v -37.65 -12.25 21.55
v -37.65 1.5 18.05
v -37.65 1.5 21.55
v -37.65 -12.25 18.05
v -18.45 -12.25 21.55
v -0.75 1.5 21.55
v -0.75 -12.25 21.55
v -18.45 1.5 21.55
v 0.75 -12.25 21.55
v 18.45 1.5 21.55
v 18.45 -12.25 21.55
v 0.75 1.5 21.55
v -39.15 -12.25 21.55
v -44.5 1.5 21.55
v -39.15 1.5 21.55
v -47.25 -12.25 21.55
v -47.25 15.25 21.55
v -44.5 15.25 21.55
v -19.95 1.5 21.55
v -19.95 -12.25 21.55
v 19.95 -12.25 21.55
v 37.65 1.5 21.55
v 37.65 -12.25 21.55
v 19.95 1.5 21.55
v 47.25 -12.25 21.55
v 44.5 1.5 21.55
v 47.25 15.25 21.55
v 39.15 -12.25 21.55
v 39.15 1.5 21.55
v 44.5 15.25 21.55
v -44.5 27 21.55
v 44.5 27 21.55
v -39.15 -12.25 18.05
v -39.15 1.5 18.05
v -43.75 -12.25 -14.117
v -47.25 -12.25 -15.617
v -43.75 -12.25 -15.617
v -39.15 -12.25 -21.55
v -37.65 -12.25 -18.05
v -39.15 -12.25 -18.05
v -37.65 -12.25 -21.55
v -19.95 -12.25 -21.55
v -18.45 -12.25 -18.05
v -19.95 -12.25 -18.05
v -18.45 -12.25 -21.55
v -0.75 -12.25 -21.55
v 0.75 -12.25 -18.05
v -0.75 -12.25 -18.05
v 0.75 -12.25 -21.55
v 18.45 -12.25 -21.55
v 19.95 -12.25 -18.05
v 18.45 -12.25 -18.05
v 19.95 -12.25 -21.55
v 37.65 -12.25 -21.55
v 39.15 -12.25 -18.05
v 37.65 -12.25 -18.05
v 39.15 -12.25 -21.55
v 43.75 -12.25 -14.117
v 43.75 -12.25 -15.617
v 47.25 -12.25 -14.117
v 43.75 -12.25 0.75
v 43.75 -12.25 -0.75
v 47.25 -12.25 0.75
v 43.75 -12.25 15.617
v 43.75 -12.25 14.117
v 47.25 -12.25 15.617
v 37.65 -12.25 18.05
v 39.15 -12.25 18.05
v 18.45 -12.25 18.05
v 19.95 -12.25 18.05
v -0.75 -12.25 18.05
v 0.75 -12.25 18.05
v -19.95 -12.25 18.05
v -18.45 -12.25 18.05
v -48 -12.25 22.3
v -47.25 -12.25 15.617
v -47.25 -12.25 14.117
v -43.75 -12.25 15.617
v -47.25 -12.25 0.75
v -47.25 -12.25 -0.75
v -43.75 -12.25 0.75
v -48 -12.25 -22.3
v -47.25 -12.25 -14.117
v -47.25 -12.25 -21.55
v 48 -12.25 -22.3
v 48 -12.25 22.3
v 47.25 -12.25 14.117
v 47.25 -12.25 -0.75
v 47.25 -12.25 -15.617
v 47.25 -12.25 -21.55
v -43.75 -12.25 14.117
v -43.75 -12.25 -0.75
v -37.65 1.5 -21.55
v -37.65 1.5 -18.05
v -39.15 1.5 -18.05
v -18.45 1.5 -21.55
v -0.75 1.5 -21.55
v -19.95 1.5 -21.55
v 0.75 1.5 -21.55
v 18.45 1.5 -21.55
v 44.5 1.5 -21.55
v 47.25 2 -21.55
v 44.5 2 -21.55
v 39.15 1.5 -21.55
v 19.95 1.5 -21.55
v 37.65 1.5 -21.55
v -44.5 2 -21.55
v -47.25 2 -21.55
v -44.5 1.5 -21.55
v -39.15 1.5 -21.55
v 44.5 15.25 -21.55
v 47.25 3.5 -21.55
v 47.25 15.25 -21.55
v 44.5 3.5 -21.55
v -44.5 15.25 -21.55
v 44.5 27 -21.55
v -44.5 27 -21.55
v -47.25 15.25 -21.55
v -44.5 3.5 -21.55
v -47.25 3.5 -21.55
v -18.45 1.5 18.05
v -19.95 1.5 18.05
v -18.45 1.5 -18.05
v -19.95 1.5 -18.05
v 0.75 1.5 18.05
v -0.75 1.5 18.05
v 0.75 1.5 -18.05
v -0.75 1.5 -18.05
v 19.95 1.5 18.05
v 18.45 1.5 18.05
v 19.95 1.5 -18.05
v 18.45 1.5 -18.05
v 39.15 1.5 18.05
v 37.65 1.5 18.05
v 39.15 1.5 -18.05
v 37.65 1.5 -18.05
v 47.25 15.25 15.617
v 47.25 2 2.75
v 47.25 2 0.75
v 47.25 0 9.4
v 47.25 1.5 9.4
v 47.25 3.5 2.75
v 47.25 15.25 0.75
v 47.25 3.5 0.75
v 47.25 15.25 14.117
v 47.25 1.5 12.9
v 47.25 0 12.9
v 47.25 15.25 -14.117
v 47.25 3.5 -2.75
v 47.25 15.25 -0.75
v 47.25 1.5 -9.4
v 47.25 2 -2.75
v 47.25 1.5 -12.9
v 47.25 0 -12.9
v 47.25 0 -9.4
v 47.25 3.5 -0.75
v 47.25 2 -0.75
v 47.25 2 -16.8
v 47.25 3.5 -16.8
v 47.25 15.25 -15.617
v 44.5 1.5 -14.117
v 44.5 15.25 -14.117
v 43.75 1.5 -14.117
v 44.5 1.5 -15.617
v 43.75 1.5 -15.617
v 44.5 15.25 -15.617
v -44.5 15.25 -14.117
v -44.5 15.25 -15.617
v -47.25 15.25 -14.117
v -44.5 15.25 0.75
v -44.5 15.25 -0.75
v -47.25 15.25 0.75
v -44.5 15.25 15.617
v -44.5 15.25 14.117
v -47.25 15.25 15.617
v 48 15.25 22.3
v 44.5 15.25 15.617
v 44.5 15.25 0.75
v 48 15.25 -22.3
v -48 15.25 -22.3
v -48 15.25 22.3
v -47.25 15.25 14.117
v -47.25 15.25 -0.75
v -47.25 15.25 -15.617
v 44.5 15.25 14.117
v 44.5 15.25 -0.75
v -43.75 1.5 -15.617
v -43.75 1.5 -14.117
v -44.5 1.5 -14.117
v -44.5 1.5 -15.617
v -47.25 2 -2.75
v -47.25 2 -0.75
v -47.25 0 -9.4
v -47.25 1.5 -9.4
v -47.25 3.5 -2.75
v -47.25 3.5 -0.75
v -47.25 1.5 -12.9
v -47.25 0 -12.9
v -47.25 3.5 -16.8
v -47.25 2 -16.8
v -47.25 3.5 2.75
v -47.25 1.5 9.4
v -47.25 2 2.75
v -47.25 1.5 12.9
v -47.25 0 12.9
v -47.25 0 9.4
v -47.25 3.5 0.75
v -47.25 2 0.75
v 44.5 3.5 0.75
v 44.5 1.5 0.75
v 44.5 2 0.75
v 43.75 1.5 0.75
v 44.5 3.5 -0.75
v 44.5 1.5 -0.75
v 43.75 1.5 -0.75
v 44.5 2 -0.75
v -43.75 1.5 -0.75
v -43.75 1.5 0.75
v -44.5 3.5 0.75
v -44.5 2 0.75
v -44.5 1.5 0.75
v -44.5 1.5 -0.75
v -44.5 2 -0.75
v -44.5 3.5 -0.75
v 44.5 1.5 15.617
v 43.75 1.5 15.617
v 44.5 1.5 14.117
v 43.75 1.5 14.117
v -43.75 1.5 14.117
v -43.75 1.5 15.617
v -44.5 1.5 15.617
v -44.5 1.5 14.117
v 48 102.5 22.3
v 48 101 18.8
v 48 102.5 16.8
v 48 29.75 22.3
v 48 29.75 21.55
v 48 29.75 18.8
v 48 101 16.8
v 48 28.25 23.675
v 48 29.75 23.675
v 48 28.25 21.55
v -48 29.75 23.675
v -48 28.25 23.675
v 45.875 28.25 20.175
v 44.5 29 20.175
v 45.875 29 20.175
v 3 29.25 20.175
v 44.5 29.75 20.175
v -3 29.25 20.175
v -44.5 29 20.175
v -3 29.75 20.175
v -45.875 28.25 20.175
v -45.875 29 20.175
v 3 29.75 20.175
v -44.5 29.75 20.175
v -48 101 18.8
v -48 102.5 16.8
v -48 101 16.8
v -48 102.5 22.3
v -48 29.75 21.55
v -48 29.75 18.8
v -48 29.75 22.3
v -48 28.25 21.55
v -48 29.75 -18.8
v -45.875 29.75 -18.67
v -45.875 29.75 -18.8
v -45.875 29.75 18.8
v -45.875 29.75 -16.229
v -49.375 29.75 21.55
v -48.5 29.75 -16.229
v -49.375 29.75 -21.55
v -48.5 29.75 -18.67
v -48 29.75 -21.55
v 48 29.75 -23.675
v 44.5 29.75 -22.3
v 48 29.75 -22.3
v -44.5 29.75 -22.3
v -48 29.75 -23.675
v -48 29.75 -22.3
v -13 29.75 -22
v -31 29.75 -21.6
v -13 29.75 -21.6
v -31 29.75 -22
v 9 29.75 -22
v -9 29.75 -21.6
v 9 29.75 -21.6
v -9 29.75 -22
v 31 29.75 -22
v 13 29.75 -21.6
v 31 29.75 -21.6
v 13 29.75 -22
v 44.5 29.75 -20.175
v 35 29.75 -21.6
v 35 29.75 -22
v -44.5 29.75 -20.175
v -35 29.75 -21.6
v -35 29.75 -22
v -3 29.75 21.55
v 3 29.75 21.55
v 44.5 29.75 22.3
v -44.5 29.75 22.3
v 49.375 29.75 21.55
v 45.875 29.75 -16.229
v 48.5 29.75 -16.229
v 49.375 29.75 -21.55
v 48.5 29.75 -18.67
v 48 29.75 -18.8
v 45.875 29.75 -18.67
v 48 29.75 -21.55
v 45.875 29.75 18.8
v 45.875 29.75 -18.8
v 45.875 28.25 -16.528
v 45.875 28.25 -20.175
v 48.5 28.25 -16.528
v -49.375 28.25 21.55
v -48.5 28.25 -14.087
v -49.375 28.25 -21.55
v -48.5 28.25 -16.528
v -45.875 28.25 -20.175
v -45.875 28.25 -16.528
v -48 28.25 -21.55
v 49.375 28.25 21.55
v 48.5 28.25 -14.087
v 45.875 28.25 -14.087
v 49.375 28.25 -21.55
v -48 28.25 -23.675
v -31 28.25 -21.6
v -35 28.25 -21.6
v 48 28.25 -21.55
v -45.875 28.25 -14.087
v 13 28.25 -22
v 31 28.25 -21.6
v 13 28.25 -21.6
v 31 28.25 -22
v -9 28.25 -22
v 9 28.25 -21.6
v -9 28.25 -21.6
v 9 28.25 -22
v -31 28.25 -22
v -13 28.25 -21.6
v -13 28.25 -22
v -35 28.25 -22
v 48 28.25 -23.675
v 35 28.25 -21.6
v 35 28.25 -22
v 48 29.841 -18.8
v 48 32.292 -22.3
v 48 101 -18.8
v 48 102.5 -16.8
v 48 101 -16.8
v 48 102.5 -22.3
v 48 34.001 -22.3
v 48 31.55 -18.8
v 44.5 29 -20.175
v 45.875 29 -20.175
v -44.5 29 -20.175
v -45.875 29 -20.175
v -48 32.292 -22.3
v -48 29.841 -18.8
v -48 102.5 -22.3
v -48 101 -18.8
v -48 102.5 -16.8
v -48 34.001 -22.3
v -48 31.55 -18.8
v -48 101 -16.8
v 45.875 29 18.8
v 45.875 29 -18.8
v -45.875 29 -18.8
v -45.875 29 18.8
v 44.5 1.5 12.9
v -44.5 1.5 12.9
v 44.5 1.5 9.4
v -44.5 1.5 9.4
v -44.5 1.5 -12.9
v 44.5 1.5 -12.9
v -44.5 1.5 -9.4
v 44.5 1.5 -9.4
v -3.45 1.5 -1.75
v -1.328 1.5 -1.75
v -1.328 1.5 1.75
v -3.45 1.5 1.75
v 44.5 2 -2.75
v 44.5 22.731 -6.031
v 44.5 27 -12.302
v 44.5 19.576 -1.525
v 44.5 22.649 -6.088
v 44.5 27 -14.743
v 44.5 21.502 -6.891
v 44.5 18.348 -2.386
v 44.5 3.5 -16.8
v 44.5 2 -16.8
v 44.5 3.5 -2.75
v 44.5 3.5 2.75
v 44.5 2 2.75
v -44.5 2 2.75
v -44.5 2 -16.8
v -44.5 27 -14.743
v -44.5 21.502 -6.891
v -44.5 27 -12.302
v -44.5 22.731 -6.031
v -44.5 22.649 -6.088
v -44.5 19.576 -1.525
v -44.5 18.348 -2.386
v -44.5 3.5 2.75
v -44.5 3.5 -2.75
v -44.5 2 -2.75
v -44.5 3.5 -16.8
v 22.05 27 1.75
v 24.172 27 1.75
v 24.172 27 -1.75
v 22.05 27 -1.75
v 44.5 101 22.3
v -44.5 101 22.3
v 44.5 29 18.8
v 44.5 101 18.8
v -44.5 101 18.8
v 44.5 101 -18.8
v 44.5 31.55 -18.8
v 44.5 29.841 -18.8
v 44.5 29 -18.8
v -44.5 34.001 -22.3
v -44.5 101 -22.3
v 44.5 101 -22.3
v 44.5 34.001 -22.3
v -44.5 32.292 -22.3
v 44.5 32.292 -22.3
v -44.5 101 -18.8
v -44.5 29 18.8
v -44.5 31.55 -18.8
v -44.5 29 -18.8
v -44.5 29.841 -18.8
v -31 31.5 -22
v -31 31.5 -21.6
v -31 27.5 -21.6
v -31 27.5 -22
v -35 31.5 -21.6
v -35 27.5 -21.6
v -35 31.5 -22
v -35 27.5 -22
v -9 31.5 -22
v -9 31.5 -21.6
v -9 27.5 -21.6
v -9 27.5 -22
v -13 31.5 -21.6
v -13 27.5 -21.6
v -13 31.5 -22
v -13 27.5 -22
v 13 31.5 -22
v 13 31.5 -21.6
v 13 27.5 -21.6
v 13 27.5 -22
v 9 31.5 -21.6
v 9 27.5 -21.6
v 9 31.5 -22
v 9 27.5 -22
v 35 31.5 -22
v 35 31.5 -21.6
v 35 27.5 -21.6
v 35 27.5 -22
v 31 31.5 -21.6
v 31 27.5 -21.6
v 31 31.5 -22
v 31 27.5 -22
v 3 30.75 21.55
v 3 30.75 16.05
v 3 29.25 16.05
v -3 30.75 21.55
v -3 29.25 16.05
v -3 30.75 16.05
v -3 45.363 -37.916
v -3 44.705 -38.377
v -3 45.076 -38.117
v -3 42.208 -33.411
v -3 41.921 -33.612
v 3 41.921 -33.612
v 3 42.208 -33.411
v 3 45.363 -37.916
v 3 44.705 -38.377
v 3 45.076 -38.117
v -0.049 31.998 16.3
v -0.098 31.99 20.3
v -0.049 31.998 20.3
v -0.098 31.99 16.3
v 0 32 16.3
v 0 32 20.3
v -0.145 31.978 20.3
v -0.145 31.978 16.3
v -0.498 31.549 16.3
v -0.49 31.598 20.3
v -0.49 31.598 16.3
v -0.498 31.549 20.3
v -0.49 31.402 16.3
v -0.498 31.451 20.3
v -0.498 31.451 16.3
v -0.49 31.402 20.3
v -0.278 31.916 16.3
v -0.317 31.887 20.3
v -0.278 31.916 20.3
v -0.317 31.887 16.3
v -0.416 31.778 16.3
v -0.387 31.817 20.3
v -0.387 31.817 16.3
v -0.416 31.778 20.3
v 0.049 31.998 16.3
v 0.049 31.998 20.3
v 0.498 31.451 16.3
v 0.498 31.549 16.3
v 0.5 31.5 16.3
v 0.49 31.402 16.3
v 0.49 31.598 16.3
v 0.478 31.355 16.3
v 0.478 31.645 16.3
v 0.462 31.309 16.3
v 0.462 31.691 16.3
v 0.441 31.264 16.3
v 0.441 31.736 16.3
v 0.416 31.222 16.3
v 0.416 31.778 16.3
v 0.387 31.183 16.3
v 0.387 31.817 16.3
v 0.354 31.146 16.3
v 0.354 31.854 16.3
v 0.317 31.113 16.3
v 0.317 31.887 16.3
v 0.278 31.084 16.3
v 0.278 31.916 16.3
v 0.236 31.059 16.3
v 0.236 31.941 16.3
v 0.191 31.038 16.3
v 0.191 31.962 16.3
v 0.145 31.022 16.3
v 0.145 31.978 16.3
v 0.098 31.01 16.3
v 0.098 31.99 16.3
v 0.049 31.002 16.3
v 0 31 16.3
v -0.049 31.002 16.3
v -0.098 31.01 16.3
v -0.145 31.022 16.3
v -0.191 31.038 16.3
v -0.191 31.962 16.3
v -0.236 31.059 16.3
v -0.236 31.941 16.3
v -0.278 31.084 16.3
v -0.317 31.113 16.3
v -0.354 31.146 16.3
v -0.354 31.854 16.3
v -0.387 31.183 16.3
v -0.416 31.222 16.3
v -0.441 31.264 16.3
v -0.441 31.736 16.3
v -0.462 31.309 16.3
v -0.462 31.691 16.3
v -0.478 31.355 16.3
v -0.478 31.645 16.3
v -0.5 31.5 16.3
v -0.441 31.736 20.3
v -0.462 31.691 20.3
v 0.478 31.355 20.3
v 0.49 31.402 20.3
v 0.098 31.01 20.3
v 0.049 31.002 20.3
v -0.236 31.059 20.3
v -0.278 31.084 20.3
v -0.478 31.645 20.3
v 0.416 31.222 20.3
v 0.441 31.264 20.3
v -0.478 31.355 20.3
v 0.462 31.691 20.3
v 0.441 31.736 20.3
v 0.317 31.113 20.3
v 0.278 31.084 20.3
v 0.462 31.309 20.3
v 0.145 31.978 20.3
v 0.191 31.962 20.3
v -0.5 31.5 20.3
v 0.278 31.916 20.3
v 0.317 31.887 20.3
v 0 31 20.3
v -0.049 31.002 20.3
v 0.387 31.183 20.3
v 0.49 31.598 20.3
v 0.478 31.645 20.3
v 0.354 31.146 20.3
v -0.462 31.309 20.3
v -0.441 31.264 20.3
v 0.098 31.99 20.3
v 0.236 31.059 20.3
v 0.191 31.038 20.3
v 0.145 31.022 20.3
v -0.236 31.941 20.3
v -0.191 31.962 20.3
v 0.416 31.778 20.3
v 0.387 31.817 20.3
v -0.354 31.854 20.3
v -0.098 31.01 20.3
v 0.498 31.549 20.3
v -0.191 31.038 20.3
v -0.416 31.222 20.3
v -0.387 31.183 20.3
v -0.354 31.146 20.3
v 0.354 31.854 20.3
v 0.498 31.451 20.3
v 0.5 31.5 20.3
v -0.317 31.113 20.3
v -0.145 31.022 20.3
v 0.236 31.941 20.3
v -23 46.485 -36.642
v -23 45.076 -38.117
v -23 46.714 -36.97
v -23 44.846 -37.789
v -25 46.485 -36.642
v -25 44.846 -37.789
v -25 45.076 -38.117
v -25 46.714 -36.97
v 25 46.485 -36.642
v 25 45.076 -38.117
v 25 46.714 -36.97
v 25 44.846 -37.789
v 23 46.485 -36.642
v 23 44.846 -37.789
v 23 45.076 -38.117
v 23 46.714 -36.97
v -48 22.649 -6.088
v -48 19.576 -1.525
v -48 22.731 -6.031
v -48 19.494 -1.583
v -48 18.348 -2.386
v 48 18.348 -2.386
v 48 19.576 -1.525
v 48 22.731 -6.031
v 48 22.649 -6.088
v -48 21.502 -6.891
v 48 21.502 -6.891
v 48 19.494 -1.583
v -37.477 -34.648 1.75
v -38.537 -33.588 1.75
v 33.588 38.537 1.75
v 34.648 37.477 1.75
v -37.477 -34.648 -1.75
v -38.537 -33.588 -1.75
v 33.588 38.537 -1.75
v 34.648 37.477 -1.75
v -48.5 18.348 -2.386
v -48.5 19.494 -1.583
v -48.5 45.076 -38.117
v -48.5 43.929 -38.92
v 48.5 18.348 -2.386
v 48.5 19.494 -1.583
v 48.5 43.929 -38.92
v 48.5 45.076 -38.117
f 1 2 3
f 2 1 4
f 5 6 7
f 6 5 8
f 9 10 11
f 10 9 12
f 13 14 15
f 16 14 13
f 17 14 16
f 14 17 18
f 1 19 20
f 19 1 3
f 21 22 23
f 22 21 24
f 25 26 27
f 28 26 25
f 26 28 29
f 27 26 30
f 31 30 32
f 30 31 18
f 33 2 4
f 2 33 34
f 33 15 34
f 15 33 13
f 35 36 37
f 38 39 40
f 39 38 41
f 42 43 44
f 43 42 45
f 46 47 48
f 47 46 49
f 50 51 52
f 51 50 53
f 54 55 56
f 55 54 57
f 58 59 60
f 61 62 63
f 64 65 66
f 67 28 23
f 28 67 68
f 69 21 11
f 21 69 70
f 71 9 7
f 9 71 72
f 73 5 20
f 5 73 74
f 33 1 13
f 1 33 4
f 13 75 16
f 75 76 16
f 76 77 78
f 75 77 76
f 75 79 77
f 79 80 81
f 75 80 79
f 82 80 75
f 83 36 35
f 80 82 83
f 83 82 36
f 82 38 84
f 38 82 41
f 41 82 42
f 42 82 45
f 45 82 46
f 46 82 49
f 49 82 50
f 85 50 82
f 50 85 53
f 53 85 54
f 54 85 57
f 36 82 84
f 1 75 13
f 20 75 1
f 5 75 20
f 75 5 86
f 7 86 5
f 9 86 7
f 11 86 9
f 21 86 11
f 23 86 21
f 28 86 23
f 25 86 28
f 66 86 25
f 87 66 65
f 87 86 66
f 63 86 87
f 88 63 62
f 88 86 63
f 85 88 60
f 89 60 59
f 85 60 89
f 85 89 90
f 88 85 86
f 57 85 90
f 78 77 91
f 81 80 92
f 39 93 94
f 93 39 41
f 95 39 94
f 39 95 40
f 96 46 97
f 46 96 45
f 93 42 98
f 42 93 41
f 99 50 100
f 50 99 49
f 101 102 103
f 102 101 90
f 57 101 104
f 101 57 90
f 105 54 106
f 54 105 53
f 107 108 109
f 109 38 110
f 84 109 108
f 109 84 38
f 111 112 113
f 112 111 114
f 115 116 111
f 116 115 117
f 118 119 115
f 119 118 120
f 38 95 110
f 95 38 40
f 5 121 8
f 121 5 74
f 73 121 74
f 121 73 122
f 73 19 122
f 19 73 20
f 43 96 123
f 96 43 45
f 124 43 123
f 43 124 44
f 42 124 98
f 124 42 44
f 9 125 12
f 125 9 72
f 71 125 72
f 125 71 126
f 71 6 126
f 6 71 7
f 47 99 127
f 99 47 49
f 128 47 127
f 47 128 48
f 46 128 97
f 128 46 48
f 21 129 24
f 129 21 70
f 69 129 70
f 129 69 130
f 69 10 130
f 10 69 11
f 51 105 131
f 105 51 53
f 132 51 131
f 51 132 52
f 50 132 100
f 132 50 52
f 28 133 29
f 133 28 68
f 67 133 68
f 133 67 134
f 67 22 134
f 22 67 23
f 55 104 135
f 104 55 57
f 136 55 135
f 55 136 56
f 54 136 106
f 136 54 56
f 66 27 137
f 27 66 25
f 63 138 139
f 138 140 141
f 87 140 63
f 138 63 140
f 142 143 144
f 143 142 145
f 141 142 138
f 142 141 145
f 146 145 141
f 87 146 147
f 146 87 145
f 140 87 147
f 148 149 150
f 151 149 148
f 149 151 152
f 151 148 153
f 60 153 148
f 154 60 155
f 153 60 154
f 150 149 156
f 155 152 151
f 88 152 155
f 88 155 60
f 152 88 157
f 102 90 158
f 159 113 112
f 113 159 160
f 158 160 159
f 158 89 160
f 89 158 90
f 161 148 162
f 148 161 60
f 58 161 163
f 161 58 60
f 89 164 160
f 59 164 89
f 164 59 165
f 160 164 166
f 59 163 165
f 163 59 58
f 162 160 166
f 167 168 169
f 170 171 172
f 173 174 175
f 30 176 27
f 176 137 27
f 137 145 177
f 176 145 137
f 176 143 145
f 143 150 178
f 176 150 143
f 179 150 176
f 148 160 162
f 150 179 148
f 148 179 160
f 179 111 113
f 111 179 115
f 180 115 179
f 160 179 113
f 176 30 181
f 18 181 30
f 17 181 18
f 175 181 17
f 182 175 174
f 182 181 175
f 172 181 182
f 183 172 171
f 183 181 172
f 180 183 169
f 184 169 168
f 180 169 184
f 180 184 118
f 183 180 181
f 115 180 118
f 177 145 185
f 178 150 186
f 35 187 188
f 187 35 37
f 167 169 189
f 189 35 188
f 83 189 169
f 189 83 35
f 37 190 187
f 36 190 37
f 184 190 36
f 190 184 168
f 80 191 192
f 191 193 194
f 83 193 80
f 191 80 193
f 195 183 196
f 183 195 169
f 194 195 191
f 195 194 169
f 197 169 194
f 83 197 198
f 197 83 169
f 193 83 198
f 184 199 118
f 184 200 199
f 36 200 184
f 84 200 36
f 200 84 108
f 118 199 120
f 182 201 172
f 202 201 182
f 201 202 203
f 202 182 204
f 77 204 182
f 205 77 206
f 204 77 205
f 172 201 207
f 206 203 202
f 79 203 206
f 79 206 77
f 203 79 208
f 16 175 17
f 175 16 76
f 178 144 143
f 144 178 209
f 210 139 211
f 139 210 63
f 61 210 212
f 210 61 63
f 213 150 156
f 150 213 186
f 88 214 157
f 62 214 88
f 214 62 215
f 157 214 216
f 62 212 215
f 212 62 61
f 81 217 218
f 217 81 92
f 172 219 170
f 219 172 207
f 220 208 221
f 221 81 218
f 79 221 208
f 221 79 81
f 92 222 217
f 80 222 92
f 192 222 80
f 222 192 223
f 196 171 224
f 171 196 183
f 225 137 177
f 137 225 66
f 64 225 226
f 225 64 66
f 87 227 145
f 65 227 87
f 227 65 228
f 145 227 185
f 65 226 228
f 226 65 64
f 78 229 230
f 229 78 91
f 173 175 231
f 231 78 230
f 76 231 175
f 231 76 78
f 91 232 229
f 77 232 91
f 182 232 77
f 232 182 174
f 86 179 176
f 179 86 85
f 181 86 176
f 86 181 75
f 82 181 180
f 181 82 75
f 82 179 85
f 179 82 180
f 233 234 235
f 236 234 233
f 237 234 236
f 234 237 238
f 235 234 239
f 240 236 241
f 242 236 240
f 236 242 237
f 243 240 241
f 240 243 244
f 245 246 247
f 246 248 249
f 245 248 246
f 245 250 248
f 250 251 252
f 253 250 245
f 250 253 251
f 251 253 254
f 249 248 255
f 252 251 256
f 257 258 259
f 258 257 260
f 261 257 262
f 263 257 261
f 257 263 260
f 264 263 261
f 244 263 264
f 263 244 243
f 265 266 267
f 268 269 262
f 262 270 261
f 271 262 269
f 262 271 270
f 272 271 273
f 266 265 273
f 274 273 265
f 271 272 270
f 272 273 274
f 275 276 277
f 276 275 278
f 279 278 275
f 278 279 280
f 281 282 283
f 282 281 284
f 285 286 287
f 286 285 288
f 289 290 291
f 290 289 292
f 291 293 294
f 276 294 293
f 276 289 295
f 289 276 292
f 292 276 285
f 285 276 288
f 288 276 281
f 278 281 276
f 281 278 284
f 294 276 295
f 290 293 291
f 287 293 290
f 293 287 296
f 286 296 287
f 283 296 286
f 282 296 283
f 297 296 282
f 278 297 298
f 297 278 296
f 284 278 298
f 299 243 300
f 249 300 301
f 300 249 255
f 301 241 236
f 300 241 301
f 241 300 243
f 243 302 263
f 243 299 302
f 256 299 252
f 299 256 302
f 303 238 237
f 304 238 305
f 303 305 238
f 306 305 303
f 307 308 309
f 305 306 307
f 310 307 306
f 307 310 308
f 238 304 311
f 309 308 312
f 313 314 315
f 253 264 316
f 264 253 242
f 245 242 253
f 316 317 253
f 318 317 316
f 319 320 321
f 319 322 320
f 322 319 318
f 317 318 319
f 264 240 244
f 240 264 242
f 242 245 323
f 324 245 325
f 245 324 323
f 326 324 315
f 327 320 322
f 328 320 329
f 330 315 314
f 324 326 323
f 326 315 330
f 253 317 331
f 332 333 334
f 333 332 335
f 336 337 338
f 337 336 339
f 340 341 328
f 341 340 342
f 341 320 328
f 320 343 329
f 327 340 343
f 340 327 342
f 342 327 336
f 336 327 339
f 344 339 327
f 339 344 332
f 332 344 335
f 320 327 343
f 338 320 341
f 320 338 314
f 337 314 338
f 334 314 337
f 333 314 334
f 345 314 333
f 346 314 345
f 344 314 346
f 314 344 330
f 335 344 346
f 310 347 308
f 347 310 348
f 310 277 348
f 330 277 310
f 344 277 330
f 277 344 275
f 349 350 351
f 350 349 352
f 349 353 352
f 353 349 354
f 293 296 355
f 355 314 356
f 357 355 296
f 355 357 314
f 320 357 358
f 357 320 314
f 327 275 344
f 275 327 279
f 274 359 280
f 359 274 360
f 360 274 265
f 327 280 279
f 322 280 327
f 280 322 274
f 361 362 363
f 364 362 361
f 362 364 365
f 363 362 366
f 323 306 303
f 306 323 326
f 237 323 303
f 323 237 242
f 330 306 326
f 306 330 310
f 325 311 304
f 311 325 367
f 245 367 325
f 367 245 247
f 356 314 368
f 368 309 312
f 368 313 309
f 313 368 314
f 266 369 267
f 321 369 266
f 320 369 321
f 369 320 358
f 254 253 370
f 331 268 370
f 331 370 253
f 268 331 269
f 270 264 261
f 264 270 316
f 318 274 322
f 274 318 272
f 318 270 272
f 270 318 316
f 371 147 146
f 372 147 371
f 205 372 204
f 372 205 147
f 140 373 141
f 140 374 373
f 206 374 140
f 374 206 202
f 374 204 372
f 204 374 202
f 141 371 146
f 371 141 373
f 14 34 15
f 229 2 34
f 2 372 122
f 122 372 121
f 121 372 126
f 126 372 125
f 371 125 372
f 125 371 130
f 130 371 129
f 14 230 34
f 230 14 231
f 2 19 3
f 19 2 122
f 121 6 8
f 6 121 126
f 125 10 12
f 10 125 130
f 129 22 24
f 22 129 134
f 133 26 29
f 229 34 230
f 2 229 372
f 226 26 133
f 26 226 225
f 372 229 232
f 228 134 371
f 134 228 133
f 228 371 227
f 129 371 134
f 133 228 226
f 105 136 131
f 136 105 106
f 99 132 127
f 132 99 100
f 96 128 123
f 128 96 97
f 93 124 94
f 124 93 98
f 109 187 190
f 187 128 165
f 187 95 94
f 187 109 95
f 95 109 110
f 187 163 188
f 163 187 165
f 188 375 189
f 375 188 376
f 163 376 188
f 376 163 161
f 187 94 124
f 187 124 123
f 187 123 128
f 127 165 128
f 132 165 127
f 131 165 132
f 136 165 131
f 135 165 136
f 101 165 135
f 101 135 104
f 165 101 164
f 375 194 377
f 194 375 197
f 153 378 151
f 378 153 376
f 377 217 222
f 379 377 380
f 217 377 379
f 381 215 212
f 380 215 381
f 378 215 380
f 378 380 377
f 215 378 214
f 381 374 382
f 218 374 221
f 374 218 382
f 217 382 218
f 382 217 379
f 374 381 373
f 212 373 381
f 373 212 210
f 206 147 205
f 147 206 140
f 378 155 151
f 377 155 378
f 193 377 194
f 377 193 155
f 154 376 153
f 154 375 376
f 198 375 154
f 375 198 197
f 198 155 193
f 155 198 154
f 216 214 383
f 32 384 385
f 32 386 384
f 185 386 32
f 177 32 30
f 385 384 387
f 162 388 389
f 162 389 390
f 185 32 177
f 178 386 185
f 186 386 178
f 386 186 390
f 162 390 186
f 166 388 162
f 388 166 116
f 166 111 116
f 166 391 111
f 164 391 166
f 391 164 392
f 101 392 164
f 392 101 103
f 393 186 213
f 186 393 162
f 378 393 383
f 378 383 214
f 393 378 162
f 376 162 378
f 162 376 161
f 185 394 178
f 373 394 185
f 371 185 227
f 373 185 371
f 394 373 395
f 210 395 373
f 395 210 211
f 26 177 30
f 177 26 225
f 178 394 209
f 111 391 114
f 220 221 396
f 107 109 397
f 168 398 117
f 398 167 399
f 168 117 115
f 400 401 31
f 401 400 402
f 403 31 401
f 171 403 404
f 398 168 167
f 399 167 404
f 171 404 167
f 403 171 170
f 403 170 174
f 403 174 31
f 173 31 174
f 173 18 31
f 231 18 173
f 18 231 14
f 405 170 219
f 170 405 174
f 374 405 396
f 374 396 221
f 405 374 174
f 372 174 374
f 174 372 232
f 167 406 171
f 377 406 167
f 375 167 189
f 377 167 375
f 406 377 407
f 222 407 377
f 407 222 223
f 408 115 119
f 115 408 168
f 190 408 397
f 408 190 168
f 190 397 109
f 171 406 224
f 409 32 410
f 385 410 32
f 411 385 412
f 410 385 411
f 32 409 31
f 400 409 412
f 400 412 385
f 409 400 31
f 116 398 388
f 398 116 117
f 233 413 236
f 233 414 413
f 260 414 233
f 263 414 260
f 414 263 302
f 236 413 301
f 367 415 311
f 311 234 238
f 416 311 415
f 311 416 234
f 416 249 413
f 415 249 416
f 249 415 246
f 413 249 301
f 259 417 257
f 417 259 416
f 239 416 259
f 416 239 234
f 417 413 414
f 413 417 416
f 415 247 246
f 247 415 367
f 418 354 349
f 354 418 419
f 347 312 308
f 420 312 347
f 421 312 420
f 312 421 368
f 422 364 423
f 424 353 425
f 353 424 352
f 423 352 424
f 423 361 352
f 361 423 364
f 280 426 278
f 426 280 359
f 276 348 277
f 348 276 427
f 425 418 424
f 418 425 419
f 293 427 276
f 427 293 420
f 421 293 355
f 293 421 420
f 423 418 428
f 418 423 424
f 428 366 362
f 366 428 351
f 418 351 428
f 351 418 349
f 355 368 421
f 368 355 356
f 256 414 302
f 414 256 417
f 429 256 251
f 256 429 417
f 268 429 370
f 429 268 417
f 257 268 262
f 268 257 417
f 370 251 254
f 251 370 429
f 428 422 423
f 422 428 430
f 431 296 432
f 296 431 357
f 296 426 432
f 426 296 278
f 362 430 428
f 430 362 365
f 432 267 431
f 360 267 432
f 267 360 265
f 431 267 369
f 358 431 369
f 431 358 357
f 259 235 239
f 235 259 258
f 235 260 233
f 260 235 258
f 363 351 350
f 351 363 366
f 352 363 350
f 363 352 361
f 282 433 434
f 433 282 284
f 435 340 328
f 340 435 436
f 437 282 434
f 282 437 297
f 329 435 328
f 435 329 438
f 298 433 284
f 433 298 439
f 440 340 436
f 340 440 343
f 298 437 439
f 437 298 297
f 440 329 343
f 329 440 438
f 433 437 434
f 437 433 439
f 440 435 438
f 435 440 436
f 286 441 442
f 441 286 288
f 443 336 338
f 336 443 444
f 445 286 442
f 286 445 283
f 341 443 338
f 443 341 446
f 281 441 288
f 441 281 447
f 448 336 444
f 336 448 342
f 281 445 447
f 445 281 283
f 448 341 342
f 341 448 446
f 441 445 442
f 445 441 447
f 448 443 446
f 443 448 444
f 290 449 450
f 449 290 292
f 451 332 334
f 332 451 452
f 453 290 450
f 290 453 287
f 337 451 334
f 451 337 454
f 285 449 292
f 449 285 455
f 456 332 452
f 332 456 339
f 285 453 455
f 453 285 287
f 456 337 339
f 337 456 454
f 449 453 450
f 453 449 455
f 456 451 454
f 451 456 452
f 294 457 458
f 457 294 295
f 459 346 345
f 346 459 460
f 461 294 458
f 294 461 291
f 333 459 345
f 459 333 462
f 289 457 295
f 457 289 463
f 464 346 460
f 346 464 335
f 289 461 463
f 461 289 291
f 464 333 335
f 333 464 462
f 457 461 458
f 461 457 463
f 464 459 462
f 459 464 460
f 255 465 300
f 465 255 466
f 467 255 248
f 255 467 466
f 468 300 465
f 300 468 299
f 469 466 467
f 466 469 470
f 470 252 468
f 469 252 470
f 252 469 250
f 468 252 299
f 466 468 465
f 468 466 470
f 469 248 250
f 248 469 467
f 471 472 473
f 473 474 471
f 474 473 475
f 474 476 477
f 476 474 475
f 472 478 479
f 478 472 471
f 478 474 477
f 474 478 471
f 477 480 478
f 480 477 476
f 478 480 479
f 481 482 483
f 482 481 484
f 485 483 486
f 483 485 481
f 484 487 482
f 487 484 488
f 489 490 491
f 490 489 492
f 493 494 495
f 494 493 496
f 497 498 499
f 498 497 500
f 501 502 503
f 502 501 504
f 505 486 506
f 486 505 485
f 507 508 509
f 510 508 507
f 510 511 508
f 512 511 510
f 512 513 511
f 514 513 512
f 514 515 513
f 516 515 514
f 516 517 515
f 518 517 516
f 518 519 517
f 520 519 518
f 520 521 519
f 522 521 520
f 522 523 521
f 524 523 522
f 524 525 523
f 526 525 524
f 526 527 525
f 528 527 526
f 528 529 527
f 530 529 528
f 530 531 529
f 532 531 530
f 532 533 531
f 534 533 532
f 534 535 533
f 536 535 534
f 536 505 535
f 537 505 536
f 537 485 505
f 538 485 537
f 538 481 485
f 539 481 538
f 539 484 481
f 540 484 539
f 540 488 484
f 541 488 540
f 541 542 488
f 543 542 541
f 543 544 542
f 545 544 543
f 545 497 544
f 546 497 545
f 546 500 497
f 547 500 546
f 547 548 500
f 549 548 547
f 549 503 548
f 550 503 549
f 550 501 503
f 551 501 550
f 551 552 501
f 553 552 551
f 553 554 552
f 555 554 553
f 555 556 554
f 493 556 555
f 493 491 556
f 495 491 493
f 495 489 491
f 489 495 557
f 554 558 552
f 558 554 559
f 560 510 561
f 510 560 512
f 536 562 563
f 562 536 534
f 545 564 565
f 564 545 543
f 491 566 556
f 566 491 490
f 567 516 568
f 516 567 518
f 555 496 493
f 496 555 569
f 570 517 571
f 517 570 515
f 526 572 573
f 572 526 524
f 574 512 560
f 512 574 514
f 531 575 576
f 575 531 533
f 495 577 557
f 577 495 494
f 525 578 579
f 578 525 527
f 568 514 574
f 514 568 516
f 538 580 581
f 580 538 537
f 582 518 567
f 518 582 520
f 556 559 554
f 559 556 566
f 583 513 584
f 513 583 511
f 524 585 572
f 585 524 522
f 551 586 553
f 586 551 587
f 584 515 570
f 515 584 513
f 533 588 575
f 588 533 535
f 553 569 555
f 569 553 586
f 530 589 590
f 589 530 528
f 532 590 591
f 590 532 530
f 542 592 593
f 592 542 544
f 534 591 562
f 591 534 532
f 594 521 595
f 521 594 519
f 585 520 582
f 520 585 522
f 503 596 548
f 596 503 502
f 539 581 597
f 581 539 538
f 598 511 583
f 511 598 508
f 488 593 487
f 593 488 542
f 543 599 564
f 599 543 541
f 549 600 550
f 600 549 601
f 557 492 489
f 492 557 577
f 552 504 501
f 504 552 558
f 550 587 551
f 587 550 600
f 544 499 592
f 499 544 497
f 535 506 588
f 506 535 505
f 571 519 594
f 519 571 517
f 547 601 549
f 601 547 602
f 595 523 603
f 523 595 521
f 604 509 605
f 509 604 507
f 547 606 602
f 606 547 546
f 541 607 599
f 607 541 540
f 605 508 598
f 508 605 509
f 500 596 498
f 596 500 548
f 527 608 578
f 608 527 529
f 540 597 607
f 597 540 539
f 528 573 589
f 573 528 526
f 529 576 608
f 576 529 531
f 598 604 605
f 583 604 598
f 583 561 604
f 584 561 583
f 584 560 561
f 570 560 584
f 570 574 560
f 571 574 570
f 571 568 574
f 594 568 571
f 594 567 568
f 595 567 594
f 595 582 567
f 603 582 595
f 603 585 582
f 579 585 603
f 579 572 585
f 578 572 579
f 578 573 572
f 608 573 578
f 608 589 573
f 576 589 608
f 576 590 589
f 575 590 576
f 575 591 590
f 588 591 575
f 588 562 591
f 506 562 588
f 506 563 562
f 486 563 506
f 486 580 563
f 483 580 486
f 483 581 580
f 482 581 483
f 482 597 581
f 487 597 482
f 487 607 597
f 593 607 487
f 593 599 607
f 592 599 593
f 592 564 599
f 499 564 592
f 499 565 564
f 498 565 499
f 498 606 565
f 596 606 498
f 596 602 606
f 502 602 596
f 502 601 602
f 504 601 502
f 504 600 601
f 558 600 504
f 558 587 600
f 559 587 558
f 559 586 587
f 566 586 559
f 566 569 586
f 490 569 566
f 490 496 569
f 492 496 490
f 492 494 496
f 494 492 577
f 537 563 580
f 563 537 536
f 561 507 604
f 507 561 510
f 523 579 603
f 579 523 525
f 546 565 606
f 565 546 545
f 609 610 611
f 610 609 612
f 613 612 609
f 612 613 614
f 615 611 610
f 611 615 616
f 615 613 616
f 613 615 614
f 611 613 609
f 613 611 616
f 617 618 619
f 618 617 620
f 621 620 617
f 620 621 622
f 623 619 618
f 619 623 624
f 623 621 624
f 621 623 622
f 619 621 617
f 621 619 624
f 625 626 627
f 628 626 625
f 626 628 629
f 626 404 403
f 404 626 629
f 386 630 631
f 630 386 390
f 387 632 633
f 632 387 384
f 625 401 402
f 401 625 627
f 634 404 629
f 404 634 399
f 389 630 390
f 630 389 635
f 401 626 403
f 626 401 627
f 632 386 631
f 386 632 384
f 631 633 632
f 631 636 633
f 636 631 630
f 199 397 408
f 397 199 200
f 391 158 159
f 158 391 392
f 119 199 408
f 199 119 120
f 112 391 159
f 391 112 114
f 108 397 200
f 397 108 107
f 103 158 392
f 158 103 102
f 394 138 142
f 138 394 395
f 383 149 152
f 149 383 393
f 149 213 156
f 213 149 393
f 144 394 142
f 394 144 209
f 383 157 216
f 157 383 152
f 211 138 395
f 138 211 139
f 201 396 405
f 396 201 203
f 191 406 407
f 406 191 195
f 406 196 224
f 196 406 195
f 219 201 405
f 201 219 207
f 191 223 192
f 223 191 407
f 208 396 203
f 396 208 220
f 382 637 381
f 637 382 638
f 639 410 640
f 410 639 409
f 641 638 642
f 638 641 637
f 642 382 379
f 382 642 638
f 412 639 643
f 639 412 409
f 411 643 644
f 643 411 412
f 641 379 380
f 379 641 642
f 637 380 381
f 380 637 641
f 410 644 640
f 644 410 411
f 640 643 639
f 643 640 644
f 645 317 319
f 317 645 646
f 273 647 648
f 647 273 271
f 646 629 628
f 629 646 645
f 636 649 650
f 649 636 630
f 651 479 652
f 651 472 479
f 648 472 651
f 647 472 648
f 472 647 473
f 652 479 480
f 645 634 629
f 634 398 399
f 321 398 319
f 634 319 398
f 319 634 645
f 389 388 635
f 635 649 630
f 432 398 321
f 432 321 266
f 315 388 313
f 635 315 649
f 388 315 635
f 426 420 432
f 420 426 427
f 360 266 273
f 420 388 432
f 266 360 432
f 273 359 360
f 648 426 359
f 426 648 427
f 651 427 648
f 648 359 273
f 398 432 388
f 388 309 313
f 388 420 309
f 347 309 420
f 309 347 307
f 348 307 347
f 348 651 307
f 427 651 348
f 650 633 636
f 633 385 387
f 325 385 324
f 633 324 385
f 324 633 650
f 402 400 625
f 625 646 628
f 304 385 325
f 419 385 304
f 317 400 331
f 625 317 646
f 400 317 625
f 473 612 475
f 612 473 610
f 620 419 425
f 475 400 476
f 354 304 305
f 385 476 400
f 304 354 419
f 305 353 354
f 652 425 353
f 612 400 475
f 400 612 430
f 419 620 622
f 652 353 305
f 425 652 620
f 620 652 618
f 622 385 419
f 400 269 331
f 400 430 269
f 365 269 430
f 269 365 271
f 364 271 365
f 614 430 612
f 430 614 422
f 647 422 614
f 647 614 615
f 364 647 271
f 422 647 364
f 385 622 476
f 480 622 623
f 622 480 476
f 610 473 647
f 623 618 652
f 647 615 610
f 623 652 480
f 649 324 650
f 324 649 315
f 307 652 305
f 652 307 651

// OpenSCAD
// file: ../wattplot_params.scad
// =============================================================================
// wattplot_params.scad -- mirror of wattplot_params.py
// =============================================================================
//
// DO NOT EDIT THESE NUMBERS WITHOUT UPDATING wattplot_params.py AND
// firmware/tests/test_openscad_params.py.
//
// The Python source of truth is wattplot_params.py at the repo root.
// This file is a hand-maintained mirror so the OpenSCAD models can
// render without Python. A CI test (test_openscad_params.py) reads
// both and fails if any number has drifted.
//
// If you change a value here, change it in wattplot_params.py first
// and update the test expectations in test_openscad_params.py. The
// commit message should reference the param name (e.g.
// "scad: bump POSTS.height_in to 78 for v3.1 storm margin").
//
// All dimensions are in inches. OpenSCAD's $fn controls mesh
// resolution -- 64 gives a clean STL that's about 2 MB at this
// model's complexity.

// ---------- LOCATION ----------
location_latitude  = 33.45;     // Phoenix, AZ
location_longitude = -112.07;
location_elevation_m = 337;
location_design_wind_mph = 115.0; // ASCE 7-22, Risk Cat II 700-yr

// ---------- PLANTER LIMITS ----------
max_planter_L_in = 96.0;          // 8 ft stock, no waste on long rails
max_planter_W_in = 60.0;          // 5 ft (8 ft cross-cut, 2 cross-rails per board)

// ---------- BED (planter, ballasted) ----------
bed_outer_L_in       = 96.0;       // 8 ft (capped at max_planter_L_in)
bed_outer_W_in       = 44.6;       // matches panel width
bed_wall_thk_in      = 0.75;       // 1x6 cedar (3/4" actual)
bed_wall_h_in        = 27.5;       // 5 courses of 1x6 (5.5" actual)
                                   //   wind-sized: SF_overturning 2.55 at 35°
bed_soil_fill_in     = 25.5;       // 2" freeboard below the rim
                                   //   ~60 cu ft = 2.2 cu yd = ~4,000 lb
bed_skid_h_in        = 1.5;        // walls rest on 2x4 footers
bed_skid_side_in     = 3.5;        // 4x nominal

// ---------- BED WALL (1x6 cedar skin over 2x4 cleats) ----------
wall_skin_thk_in   = 0.75;
wall_course_h_in   = 5.5;
wall_courses       = 5;            // 5 x 5.5" = 27.5" wall
wall_cleat_thk_in  = 1.5;          // 2x4 actual
wall_cleat_wid_in  = 3.5;          // 2x4 actual
wall_cleats_long   = 5;            // per long wall
wall_cleats_short  = 3;            // per short wall
wall_header_thk_in = 1.5;         // 2x4 on wide face
wall_header_wid_in = 3.5;

// ---------- POSTS (4x4 PT, 72" tall, walk-under canopy) ----------
post_thk_in  = 3.5;               // 4x4 actual
post_height_in = 72.0;            // 6 ft -- walk-under / reach-under
post_count   = 4;
post_rail_thk_in = 1.5;          // 2x6 on post tops
post_rail_wid_in = 5.5;

// ---------- PANEL (LONGi Hi-MO X10 620W default) ----------
panel_L_in        = 97.0;         // 8.08 ft (overhangs bed 0.5"/side)
panel_W_in        = 44.6;         // 3.72 ft
panel_thk_in      = 1.4;
panel_mass_lb     = 65.0;
panel_wattage     = 620;
panel_tilt_deg    = 35.0;         // 0 = flat, 35 = max (wind-limited)

// ---------- CONTROL (tilt cap + PI setpoint) ----------
control_max_tilt_deg  = 35.0;     // STRUCTURAL cap. See ADR-001.
control_target_current_A = 0.5;
control_hard_current_limit_A = 2.5;

// ---------- FRAME (perimeter around the panel) ----------
frame_long_rail_thk_in   = 1.5;    // 2x6 actual
frame_long_rail_wid_in   = 5.5;
frame_long_rail_length_in = 96.0;  // 8 ft stock, no waste

frame_cross_rail_thk_in   = 1.5;   // 2x6 actual
frame_cross_rail_wid_in   = 5.5;
frame_cross_rail_length_in = 42.0; // 2x6x8ft cut to 42"

frame_brace_thk_in   = 1.5;         // 2x4 actual
frame_brace_wid_in   = 3.5;
frame_brace_length_in = 102.0;     // 2x4x10ft cut to 102"

// ---------- HINGES + PANEL CLAMPS ----------
hinge_leaf_in    = 4.0;            // 4"x4" leaf, 1/2" pin
hinge_pin_d_in    = 0.5;
hinge_count      = 4;
hinge_spacing_in = 22.0;           // 22" o.c.
hinge_rod_length_in = 72.0;        // 1/2" x 72" steel rod (HD)

panel_clamp_length_in = 2.0;       // IronRidge mid-clamp, 35mm channel
panel_clamp_height_in = 2.0;
panel_clamp_thk_in   = 0.4;
panel_clamps_per_long_rail  = 2;
panel_clamps_per_cross_rail = 1;

// ---------- ACTUATOR MOUNT ----------
actuator_block_thk_in  = 1.5;      // 2x6 actual
actuator_block_wid_in  = 5.5;
actuator_block_length_in = 6.0;
actuator_stroke_in     = 4.0;       // 12V linear actuator
actuator_width_in      = 2.0;       // body width (for clearance check)
actuator_height_in     = 2.5;

// ---------- DERIVED (don't change) ----------
// Bed is sized so the panel overhangs the rails by 0.5" per side.
// The panel mid-clamps grip the aluminum frame, not the glass.
bed_inner_L_in = bed_outer_L_in - 2 * post_thk_in;
bed_inner_W_in = bed_outer_W_in - 2 * wall_skin_thk_in;
// Wall sits on top of skid; rim = wall + skid.
bed_rim_h_in = bed_wall_h_in + bed_skid_h_in;
// Panel frame offset above the bed rail (clearance for the clamp).
panel_clearance_in = 2.0;         // 2" above the rail top

// Render resolution: $fn controls segment count for curves.
// 64 gives a clean STL ~2 MB. Lower for fast preview, higher for
// 3D printing.
$fn = 64;
// main file
// presets/commercial_96cell.scad -- common 2014-2020 salvage (e.g. SunPower SPR-400)

include <../wattplot_params.scad>
panel_L_in     = 65.0;
panel_W_in     = 41.0;
panel_wattage  = 400;

use <../wattplot.scad>

if (is_undef($use_only)) {
    $fn = 64;
    bed_assembly();
    posts_assembly();
    hinges_assembly();
    actuator_assembly();
    frame_assembly();
    panel_assembly();
}
